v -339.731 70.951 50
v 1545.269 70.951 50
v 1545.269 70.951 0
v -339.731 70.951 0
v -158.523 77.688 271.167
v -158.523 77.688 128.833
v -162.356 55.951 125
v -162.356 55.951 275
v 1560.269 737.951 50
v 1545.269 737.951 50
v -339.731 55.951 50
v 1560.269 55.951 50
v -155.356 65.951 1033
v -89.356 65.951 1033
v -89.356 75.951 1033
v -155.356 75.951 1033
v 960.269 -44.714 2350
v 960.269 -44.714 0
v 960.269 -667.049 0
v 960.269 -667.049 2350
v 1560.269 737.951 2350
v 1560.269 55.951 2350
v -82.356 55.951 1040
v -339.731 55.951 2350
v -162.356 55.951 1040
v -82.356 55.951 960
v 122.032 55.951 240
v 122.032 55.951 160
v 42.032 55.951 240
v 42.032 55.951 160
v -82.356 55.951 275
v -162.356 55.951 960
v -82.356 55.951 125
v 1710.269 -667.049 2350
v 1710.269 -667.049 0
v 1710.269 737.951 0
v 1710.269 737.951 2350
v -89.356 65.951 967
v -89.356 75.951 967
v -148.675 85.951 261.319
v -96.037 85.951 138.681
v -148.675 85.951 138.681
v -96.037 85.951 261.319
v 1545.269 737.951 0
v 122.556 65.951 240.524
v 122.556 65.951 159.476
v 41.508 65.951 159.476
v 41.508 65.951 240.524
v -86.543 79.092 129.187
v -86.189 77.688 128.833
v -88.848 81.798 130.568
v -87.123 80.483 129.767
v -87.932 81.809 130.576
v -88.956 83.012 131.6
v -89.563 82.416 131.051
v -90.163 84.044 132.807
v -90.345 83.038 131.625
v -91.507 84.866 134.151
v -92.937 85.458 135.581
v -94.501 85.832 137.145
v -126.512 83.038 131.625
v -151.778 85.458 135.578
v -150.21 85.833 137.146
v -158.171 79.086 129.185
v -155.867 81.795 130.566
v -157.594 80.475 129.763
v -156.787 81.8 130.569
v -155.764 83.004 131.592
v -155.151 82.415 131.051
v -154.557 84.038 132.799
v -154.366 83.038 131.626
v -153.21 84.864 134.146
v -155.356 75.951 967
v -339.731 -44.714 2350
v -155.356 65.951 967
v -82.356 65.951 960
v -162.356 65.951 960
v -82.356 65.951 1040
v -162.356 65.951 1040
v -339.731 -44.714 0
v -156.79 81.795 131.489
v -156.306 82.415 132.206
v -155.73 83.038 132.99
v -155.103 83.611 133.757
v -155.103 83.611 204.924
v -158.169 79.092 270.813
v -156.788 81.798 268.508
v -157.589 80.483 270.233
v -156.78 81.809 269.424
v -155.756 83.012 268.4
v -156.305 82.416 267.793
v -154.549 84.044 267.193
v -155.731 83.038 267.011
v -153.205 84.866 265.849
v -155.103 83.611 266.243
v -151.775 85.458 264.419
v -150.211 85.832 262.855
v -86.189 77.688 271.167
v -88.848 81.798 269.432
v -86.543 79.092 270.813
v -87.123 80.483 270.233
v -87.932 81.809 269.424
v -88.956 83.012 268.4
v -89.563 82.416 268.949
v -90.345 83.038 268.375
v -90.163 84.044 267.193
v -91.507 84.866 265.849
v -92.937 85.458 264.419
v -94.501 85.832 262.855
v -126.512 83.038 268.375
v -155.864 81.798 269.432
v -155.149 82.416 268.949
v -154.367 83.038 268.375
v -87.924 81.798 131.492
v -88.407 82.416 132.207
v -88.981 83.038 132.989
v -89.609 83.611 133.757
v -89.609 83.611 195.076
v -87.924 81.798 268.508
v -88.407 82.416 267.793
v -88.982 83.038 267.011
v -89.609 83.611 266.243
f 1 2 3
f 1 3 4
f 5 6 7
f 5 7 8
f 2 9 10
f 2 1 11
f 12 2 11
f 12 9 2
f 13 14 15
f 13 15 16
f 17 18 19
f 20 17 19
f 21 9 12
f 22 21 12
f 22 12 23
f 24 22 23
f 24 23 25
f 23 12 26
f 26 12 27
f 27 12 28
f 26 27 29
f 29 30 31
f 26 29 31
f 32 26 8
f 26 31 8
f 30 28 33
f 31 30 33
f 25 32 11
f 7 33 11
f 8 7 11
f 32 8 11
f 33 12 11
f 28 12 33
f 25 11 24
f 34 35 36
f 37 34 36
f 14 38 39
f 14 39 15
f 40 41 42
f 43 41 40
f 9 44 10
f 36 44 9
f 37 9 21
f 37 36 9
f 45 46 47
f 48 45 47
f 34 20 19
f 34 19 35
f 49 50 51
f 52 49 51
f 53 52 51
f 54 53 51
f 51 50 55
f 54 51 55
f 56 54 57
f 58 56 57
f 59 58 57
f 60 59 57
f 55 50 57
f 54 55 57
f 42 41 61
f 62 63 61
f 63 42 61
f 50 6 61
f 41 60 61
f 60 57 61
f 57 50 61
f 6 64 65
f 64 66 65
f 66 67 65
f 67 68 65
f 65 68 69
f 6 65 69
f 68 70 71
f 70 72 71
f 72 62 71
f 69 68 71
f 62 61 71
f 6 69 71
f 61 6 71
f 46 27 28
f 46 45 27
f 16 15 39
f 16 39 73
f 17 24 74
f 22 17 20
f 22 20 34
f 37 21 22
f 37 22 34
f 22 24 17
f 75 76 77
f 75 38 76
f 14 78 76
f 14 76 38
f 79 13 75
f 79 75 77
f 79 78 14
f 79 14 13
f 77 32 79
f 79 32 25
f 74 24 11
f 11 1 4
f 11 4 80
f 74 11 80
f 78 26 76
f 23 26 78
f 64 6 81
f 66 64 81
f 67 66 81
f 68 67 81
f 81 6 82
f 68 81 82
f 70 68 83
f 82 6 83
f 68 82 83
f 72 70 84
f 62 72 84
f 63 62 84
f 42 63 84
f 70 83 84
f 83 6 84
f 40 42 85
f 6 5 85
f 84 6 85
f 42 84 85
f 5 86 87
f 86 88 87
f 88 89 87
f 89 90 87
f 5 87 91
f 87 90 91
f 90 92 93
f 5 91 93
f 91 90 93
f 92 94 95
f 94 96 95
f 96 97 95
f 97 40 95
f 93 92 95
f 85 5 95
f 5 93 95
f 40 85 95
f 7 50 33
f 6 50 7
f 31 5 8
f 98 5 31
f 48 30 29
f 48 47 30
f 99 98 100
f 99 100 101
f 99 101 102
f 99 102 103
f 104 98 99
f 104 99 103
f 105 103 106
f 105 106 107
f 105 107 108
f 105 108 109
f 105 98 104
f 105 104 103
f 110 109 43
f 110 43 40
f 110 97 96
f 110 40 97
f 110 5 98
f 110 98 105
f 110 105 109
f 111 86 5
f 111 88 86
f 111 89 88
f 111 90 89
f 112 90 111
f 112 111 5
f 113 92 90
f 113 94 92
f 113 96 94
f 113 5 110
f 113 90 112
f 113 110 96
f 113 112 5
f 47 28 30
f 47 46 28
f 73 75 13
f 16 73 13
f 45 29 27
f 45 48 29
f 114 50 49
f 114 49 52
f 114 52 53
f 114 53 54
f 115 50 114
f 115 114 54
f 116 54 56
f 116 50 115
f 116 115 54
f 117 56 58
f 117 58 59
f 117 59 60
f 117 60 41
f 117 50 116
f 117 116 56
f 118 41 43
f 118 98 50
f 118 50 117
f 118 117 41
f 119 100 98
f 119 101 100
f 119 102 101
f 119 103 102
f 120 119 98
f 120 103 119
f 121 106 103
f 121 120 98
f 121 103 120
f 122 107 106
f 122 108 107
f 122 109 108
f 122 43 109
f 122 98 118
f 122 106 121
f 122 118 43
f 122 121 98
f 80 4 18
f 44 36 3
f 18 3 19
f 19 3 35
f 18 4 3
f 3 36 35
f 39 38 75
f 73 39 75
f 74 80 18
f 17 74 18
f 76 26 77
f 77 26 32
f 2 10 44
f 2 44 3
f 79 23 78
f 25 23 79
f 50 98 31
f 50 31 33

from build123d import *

# Parameters (mm, degrees)
F1_DEPTH  = 2350
F2_W      = 682
F2_H      = 50
F4_DEPTH  = 15
F3_W      = 1900
F3_H      = 50
F5_DEPTH  = 15
F6_W      = 80
F6_H      = 80
F7_DEPTH  = 10
F8_W      = 66
F8_H      = 66
F9_DEPTH  = 10
F6_H_2    = 150
F10_DEPTH = 30
F10_TAPER = 10
F11_R     = 10
F12_DEPTH = 10
F12_TAPER = -3


with BuildPart() as f1:
    # F0 (on Top) → F1 (new body)
    with BuildSketch(Plane.XY):
        Polygon((-214.7314548492, 55.9510436533), (-339.7314548492, 55.9510436533), (-339.7314548492, -44.7143382704), (960.2685451508, -44.7143382704), (960.2685451508, -667.0489563467), (1710.2685451508, -667.0489563467), (1710.2685451508, 737.9510436533), (1560.2685451508, 737.9510436533), (1560.2685451508, 55.9510436533), (-134.7314548492, 55.9510436533), align=None)
    extrude(amount=F1_DEPTH)

    # F2 (on face) → F4 (join)
    with BuildSketch(Plane(origin=(1560.2685451508, 0, 0), x_dir=(0, -1, 0), z_dir=(-1, 0, 0))):
        with Locations((-396.9510436533, 25)):
            Rectangle(F2_W, F2_H)
    extrude(amount=F4_DEPTH)

    # F3 (on face) → F5 (join)
    with BuildSketch(Plane(origin=(0, 55.9510436533, 0), x_dir=(-1, 0, 0), z_dir=(0, 1, 0))):
        with Locations((-610.2685451508, 25)):
            Rectangle(F3_W, F3_H)
    extrude(amount=F5_DEPTH)

    # F6 (on face) → F7 (join)
    with BuildSketch(Plane(origin=(0, 55.9510436533, 0), x_dir=(-1, 0, 0), z_dir=(0, 1, 0))):
        with Locations((122.3560571671, 1000)):
            Rectangle(F6_W, F6_H)
    extrude(amount=F7_DEPTH)

    # F8 (on face) → F9 (join)
    with BuildSketch(Plane(origin=(0, 65.9510436533, 0), x_dir=(-1, 0, 0), z_dir=(0, 1, 0))):
        with Locations((122.3560571671, 1000)):
            Rectangle(F8_W, F8_H)
    extrude(amount=F9_DEPTH)

    # F6 (on face) → F10 (join)
    with BuildSketch(Plane(origin=(0, 55.9510436533, 0), x_dir=(-1, 0, 0), z_dir=(0, 1, 0))):
        with Locations((122.3560571671, 200)):
            Rectangle(F6_W, F6_H_2)
    extrude(amount=F10_DEPTH, taper=F10_TAPER)

    # F11
    f11_edges = [f1.edges().sort_by_distance(p)[0] for p in [
        (-157.066248, 85.951044, 200),
        (-122.356057, 85.951044, 269.710191),
        (-87.645867, 85.951044, 200),
        (-122.356057, 85.951044, 130.289809),
    ]]
    fillet(f11_edges, radius=F11_R)

    # F6 (on face) → F12 (join)
    with BuildSketch(Plane(origin=(0, 55.9510436533, 0), x_dir=(-1, 0, 0), z_dir=(0, 1, 0))):
        with Locations((-82.0317268372, 200)):
            Rectangle(F6_W, F6_H)
    extrude(amount=F12_DEPTH, taper=F12_TAPER)


solid = f1.part
